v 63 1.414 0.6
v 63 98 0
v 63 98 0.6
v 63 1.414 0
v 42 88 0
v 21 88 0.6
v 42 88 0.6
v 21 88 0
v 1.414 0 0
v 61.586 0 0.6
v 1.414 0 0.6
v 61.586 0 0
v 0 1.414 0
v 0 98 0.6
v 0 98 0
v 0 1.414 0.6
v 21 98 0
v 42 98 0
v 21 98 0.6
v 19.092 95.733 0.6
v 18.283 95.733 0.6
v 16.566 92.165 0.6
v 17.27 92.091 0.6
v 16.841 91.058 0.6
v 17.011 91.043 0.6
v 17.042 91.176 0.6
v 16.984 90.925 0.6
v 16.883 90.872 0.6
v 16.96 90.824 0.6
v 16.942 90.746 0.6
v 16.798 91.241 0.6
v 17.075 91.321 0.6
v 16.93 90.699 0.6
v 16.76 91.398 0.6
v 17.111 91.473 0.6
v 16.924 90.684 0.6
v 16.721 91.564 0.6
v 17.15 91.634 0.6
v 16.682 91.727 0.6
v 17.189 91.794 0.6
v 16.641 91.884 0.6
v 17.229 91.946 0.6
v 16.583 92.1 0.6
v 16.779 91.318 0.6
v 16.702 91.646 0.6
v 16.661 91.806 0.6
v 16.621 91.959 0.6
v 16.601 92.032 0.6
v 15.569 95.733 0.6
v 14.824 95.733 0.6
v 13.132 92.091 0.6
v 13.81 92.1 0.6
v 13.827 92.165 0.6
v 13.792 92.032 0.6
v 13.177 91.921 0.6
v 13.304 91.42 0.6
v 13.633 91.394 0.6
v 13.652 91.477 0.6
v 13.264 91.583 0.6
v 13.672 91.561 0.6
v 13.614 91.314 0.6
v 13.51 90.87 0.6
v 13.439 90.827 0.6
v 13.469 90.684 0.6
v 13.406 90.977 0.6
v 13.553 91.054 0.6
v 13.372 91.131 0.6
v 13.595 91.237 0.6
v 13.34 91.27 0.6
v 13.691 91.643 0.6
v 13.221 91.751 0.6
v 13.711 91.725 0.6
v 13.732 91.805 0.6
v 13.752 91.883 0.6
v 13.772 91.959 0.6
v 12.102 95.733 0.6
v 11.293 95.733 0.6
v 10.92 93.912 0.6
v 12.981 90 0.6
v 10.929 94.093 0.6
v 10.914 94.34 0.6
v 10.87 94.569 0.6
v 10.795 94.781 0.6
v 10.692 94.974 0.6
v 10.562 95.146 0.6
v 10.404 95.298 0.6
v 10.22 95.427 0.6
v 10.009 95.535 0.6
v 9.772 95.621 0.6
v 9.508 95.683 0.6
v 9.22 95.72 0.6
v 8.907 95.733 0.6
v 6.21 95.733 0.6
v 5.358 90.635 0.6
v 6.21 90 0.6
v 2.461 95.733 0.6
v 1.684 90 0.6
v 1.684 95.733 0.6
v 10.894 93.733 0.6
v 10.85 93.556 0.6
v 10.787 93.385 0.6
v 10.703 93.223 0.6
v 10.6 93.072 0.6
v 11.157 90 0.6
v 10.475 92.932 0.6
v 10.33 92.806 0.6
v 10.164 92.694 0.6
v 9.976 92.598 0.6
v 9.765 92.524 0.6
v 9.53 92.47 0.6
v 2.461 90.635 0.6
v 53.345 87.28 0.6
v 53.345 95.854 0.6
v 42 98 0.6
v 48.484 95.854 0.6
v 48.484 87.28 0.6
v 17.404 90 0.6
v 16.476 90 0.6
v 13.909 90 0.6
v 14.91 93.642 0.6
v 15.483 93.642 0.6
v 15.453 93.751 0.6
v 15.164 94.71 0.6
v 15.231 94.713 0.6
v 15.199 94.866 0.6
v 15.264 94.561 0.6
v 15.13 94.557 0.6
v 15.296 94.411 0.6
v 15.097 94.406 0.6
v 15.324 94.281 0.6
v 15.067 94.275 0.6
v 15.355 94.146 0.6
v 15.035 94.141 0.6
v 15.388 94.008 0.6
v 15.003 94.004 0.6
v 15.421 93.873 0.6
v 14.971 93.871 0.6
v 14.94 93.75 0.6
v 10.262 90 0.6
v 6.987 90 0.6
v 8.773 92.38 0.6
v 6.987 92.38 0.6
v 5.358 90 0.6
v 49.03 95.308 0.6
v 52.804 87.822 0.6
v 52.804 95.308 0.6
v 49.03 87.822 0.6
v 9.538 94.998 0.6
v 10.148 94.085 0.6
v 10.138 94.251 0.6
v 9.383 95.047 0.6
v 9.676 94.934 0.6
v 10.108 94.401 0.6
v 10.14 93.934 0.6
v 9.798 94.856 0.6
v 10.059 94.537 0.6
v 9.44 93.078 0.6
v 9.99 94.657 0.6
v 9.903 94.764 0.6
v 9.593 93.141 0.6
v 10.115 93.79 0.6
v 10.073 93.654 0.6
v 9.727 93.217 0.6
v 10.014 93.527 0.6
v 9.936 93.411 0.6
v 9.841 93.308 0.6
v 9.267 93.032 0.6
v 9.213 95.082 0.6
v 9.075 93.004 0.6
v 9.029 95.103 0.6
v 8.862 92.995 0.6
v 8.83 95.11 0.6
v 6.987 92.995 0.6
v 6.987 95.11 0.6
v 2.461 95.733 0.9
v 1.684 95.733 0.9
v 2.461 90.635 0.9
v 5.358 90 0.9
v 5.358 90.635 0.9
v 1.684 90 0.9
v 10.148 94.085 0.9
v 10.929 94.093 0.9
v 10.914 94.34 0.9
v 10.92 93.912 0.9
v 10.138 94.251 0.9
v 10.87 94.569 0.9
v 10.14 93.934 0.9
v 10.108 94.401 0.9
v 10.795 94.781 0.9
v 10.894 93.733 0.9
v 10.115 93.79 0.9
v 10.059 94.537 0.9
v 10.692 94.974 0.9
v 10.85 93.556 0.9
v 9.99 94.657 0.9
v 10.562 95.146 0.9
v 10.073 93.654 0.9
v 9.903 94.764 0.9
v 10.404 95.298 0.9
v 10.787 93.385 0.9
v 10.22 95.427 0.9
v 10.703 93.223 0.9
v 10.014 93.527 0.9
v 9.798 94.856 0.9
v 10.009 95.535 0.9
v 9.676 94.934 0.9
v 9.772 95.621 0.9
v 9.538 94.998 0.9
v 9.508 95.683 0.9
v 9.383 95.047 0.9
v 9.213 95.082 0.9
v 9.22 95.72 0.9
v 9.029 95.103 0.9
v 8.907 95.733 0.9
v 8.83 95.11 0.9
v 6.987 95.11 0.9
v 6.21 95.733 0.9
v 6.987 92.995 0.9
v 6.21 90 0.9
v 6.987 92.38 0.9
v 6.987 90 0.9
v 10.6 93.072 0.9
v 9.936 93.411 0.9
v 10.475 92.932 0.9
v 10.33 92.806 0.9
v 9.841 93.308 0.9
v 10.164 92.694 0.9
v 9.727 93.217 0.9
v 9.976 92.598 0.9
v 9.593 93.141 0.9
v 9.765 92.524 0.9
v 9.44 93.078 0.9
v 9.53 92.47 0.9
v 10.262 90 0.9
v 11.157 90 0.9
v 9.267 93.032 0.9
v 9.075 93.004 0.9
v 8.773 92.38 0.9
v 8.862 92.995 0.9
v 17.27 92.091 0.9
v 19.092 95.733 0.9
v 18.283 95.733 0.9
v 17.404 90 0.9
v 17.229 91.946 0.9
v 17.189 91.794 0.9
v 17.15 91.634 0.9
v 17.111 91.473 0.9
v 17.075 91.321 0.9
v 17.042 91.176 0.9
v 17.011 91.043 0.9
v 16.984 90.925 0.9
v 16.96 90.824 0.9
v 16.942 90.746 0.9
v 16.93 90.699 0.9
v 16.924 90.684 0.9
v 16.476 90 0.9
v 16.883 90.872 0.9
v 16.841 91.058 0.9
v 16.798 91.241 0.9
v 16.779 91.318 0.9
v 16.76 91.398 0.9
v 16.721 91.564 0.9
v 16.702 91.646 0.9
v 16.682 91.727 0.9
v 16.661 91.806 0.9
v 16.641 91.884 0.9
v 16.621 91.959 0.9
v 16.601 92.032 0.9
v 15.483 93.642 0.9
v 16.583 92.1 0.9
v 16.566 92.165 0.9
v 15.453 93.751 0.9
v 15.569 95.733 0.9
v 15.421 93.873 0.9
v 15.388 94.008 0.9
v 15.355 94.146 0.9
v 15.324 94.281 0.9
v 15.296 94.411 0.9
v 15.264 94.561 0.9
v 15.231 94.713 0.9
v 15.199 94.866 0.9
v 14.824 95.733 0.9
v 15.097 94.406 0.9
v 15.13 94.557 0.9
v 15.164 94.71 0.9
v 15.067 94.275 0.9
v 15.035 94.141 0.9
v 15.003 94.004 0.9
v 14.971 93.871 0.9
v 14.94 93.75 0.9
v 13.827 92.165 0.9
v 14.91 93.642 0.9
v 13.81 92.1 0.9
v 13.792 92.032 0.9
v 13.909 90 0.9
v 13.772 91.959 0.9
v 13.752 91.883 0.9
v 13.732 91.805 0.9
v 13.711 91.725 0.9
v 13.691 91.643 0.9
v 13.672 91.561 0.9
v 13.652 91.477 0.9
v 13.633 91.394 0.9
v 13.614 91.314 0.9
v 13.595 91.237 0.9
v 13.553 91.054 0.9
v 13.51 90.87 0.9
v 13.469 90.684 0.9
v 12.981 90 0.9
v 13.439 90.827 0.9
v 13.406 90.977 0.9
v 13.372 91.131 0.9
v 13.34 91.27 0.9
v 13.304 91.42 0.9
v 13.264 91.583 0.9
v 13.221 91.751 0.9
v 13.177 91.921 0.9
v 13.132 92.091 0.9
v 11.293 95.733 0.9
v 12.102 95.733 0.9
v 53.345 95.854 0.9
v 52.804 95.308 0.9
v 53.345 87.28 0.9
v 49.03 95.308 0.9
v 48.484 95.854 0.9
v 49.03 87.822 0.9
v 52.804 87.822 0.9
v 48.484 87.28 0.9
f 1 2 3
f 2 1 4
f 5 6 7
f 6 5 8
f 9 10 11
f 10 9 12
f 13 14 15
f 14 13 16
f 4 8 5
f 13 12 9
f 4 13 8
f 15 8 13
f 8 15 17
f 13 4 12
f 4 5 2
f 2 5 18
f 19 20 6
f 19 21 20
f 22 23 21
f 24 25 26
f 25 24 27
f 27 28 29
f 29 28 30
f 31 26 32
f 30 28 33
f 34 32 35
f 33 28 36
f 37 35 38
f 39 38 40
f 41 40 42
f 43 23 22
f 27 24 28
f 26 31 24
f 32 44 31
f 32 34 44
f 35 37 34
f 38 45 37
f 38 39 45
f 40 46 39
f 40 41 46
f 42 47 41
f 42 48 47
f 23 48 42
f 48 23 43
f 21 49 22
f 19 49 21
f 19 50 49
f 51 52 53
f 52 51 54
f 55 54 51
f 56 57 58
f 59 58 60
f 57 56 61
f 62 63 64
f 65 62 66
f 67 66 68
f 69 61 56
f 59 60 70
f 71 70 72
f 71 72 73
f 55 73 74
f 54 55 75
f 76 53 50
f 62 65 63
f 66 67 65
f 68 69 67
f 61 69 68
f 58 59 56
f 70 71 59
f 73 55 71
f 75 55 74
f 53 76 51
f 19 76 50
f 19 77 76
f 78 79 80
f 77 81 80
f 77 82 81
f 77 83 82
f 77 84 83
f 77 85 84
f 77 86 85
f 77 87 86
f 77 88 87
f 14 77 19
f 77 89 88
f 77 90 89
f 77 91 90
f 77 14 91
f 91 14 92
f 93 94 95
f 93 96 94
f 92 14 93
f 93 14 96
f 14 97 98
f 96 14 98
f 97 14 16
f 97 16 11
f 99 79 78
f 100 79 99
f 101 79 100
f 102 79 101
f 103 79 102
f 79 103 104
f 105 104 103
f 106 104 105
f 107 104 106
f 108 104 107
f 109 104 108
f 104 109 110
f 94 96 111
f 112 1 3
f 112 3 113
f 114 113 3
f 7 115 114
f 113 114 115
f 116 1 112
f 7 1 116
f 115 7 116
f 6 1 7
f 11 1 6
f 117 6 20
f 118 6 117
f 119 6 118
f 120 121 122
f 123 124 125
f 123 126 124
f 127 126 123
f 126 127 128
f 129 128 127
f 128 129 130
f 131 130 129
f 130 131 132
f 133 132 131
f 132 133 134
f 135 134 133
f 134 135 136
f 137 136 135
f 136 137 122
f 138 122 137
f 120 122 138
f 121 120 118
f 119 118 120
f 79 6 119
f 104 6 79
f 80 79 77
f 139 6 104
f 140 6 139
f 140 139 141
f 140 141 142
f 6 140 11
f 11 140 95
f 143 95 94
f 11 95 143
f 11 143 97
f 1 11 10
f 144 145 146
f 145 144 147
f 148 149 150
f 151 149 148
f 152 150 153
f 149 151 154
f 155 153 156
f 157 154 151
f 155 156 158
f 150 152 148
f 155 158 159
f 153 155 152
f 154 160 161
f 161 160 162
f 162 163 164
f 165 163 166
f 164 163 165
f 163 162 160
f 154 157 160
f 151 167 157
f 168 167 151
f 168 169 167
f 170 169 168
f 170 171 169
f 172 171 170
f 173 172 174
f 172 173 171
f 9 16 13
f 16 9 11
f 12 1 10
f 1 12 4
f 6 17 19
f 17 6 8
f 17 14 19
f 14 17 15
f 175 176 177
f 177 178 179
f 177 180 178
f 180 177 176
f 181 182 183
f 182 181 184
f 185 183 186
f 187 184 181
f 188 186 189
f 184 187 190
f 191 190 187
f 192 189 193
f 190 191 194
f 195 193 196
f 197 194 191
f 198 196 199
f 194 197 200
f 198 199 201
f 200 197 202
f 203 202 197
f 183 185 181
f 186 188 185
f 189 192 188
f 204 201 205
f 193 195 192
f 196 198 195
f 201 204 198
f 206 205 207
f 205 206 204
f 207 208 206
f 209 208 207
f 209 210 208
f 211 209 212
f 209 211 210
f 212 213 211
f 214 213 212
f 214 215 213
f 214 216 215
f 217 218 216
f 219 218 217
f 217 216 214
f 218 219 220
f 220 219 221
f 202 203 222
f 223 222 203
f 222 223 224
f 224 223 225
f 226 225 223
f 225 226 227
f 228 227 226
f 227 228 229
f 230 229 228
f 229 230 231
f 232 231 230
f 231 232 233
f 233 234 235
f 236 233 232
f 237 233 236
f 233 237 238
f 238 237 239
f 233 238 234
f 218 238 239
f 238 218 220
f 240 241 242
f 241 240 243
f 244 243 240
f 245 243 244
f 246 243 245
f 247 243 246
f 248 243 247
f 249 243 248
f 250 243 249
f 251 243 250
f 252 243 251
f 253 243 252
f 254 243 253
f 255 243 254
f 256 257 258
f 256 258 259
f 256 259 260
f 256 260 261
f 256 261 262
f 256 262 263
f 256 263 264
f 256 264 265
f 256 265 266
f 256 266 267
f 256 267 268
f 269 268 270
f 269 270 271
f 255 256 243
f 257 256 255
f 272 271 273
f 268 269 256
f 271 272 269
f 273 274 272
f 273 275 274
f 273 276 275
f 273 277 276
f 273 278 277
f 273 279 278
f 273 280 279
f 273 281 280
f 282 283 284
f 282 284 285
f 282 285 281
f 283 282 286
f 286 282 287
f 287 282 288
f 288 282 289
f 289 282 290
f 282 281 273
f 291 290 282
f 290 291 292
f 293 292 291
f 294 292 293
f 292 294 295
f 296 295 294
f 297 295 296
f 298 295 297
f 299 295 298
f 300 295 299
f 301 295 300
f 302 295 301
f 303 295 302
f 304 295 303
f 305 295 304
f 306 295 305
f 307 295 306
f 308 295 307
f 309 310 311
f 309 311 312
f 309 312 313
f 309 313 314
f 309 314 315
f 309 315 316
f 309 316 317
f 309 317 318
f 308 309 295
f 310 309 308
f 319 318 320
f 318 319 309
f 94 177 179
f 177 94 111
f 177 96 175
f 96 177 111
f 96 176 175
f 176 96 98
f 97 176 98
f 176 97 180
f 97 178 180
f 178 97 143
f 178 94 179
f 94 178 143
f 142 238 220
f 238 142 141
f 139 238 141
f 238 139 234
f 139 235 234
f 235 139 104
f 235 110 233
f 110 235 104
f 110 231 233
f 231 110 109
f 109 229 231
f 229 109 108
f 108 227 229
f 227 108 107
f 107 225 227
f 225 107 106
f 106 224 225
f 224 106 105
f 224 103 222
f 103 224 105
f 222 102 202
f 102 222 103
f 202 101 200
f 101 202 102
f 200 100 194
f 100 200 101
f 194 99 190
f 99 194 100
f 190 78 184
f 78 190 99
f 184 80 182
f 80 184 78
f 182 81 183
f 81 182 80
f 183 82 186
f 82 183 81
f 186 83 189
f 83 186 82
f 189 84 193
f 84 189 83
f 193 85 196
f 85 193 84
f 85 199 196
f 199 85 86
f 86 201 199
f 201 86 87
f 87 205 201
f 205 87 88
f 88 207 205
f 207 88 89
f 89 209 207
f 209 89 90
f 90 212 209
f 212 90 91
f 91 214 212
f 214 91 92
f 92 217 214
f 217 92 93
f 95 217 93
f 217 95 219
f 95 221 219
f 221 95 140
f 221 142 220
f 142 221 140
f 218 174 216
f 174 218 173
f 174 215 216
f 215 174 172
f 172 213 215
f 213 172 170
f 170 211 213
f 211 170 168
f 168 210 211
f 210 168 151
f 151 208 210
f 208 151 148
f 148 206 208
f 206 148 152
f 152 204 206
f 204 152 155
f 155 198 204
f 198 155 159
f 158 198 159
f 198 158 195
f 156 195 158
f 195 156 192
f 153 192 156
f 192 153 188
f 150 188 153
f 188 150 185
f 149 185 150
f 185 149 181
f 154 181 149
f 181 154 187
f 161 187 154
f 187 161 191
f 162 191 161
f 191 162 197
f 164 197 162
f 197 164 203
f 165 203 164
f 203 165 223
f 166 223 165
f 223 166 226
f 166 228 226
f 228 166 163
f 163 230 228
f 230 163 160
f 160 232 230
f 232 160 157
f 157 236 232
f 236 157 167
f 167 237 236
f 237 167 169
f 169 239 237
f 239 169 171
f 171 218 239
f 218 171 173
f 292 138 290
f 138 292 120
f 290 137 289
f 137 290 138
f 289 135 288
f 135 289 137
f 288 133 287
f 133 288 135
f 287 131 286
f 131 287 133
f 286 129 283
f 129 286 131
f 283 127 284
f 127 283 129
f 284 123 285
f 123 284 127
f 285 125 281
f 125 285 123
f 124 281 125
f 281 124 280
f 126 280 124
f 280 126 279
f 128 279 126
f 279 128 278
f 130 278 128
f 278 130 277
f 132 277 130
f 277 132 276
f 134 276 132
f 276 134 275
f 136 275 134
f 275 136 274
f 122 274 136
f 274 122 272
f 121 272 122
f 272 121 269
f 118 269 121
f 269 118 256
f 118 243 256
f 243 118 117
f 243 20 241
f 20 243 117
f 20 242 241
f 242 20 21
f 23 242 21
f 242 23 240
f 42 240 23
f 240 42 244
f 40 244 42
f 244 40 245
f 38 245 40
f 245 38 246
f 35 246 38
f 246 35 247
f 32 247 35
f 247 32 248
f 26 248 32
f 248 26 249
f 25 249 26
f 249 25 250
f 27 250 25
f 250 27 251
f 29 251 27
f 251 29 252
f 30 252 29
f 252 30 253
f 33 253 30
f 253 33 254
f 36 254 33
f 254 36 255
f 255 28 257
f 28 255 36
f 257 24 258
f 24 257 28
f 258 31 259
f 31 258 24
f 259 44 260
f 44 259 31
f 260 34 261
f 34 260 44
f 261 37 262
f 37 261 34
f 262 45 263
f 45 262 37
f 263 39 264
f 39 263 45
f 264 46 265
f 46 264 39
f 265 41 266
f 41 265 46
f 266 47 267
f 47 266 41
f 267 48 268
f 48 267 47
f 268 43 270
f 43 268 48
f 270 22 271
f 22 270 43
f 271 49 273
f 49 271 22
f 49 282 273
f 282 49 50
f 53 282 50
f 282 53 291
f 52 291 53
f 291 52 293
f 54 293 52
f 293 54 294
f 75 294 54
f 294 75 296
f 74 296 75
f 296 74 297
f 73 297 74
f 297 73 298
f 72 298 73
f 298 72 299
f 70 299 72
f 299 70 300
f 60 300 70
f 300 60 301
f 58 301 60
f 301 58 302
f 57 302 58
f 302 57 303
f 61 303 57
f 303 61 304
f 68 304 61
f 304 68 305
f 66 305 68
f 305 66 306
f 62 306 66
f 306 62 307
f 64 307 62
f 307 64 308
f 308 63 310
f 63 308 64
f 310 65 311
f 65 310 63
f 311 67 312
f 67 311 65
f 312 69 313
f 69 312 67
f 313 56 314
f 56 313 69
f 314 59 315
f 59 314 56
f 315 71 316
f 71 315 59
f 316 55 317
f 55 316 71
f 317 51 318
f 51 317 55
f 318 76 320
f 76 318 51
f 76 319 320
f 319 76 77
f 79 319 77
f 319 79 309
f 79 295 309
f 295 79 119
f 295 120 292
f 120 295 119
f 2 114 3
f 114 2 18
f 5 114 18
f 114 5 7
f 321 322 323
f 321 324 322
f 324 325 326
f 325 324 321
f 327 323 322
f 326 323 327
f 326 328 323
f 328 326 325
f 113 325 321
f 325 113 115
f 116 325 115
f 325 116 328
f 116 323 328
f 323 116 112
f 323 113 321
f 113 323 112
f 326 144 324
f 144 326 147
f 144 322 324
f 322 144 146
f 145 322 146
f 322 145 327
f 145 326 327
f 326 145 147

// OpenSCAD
/* 
Divider for MTG storage card collection with edition code. Cool tip use multicolor print from .75
 */

/* [Divider] */
// Width of the divider.
width = 63; // card width
// Height of the divider.
height = 88; //card height
// Thickness of the divider. Also acts as the diameter of all the rounded edges.
depth = .6;
//Text and font
 text = "LRW";
 font = "Liberation Sans";
 text2 = ""; //[Mana symbol from https://andrewgioia.github.io/Mana/index.html or Keyrune from https://andrewgioia.github.io/Keyrune/index.html]
 //for help just copy paste this:  
 font2 = "mana"; //[Keyrune, mana]
//tab position
 side = "both"; // [left,right,both(optional)]

module divider(width,depth,height){
    translate([0, 0, depth]) {
    rotate([-90,0,0]) {
    union() {
        difference() {
cube([width,depth,height], false);
        rotate([0,-45,0]) {
        cube([2,depth+2,5], true);
        }
        translate([width, 0, 0]) {
        rotate([0,45,0]) {
        cube([2,depth+2,5], true);
        }
        }
    }
     if (side == "left" || side == "both"){
        translate([0,0,height]){
           cube([width/3,depth,10]);
        }
   translate([1, 0, height+2]) {
       rotate([90,0,0]) {
     linear_extrude(0.3) {
       text(text = str(text), font = font, size = 6);
     }
    }
   }
}
 }
 if (side == "right" || side == "both"){
        translate([width-(width/3),0,height]){
           cube([width/3,depth,10]);
        }
   translate([width-(width/3)+6, 0, height+1]) {
       rotate([90,0,0]) {
     linear_extrude(0.3) {
       text(text = str(text2), font = font2, size = 7);
     }
    }
   }
}
 }

}
}
divider(width,depth,height);
